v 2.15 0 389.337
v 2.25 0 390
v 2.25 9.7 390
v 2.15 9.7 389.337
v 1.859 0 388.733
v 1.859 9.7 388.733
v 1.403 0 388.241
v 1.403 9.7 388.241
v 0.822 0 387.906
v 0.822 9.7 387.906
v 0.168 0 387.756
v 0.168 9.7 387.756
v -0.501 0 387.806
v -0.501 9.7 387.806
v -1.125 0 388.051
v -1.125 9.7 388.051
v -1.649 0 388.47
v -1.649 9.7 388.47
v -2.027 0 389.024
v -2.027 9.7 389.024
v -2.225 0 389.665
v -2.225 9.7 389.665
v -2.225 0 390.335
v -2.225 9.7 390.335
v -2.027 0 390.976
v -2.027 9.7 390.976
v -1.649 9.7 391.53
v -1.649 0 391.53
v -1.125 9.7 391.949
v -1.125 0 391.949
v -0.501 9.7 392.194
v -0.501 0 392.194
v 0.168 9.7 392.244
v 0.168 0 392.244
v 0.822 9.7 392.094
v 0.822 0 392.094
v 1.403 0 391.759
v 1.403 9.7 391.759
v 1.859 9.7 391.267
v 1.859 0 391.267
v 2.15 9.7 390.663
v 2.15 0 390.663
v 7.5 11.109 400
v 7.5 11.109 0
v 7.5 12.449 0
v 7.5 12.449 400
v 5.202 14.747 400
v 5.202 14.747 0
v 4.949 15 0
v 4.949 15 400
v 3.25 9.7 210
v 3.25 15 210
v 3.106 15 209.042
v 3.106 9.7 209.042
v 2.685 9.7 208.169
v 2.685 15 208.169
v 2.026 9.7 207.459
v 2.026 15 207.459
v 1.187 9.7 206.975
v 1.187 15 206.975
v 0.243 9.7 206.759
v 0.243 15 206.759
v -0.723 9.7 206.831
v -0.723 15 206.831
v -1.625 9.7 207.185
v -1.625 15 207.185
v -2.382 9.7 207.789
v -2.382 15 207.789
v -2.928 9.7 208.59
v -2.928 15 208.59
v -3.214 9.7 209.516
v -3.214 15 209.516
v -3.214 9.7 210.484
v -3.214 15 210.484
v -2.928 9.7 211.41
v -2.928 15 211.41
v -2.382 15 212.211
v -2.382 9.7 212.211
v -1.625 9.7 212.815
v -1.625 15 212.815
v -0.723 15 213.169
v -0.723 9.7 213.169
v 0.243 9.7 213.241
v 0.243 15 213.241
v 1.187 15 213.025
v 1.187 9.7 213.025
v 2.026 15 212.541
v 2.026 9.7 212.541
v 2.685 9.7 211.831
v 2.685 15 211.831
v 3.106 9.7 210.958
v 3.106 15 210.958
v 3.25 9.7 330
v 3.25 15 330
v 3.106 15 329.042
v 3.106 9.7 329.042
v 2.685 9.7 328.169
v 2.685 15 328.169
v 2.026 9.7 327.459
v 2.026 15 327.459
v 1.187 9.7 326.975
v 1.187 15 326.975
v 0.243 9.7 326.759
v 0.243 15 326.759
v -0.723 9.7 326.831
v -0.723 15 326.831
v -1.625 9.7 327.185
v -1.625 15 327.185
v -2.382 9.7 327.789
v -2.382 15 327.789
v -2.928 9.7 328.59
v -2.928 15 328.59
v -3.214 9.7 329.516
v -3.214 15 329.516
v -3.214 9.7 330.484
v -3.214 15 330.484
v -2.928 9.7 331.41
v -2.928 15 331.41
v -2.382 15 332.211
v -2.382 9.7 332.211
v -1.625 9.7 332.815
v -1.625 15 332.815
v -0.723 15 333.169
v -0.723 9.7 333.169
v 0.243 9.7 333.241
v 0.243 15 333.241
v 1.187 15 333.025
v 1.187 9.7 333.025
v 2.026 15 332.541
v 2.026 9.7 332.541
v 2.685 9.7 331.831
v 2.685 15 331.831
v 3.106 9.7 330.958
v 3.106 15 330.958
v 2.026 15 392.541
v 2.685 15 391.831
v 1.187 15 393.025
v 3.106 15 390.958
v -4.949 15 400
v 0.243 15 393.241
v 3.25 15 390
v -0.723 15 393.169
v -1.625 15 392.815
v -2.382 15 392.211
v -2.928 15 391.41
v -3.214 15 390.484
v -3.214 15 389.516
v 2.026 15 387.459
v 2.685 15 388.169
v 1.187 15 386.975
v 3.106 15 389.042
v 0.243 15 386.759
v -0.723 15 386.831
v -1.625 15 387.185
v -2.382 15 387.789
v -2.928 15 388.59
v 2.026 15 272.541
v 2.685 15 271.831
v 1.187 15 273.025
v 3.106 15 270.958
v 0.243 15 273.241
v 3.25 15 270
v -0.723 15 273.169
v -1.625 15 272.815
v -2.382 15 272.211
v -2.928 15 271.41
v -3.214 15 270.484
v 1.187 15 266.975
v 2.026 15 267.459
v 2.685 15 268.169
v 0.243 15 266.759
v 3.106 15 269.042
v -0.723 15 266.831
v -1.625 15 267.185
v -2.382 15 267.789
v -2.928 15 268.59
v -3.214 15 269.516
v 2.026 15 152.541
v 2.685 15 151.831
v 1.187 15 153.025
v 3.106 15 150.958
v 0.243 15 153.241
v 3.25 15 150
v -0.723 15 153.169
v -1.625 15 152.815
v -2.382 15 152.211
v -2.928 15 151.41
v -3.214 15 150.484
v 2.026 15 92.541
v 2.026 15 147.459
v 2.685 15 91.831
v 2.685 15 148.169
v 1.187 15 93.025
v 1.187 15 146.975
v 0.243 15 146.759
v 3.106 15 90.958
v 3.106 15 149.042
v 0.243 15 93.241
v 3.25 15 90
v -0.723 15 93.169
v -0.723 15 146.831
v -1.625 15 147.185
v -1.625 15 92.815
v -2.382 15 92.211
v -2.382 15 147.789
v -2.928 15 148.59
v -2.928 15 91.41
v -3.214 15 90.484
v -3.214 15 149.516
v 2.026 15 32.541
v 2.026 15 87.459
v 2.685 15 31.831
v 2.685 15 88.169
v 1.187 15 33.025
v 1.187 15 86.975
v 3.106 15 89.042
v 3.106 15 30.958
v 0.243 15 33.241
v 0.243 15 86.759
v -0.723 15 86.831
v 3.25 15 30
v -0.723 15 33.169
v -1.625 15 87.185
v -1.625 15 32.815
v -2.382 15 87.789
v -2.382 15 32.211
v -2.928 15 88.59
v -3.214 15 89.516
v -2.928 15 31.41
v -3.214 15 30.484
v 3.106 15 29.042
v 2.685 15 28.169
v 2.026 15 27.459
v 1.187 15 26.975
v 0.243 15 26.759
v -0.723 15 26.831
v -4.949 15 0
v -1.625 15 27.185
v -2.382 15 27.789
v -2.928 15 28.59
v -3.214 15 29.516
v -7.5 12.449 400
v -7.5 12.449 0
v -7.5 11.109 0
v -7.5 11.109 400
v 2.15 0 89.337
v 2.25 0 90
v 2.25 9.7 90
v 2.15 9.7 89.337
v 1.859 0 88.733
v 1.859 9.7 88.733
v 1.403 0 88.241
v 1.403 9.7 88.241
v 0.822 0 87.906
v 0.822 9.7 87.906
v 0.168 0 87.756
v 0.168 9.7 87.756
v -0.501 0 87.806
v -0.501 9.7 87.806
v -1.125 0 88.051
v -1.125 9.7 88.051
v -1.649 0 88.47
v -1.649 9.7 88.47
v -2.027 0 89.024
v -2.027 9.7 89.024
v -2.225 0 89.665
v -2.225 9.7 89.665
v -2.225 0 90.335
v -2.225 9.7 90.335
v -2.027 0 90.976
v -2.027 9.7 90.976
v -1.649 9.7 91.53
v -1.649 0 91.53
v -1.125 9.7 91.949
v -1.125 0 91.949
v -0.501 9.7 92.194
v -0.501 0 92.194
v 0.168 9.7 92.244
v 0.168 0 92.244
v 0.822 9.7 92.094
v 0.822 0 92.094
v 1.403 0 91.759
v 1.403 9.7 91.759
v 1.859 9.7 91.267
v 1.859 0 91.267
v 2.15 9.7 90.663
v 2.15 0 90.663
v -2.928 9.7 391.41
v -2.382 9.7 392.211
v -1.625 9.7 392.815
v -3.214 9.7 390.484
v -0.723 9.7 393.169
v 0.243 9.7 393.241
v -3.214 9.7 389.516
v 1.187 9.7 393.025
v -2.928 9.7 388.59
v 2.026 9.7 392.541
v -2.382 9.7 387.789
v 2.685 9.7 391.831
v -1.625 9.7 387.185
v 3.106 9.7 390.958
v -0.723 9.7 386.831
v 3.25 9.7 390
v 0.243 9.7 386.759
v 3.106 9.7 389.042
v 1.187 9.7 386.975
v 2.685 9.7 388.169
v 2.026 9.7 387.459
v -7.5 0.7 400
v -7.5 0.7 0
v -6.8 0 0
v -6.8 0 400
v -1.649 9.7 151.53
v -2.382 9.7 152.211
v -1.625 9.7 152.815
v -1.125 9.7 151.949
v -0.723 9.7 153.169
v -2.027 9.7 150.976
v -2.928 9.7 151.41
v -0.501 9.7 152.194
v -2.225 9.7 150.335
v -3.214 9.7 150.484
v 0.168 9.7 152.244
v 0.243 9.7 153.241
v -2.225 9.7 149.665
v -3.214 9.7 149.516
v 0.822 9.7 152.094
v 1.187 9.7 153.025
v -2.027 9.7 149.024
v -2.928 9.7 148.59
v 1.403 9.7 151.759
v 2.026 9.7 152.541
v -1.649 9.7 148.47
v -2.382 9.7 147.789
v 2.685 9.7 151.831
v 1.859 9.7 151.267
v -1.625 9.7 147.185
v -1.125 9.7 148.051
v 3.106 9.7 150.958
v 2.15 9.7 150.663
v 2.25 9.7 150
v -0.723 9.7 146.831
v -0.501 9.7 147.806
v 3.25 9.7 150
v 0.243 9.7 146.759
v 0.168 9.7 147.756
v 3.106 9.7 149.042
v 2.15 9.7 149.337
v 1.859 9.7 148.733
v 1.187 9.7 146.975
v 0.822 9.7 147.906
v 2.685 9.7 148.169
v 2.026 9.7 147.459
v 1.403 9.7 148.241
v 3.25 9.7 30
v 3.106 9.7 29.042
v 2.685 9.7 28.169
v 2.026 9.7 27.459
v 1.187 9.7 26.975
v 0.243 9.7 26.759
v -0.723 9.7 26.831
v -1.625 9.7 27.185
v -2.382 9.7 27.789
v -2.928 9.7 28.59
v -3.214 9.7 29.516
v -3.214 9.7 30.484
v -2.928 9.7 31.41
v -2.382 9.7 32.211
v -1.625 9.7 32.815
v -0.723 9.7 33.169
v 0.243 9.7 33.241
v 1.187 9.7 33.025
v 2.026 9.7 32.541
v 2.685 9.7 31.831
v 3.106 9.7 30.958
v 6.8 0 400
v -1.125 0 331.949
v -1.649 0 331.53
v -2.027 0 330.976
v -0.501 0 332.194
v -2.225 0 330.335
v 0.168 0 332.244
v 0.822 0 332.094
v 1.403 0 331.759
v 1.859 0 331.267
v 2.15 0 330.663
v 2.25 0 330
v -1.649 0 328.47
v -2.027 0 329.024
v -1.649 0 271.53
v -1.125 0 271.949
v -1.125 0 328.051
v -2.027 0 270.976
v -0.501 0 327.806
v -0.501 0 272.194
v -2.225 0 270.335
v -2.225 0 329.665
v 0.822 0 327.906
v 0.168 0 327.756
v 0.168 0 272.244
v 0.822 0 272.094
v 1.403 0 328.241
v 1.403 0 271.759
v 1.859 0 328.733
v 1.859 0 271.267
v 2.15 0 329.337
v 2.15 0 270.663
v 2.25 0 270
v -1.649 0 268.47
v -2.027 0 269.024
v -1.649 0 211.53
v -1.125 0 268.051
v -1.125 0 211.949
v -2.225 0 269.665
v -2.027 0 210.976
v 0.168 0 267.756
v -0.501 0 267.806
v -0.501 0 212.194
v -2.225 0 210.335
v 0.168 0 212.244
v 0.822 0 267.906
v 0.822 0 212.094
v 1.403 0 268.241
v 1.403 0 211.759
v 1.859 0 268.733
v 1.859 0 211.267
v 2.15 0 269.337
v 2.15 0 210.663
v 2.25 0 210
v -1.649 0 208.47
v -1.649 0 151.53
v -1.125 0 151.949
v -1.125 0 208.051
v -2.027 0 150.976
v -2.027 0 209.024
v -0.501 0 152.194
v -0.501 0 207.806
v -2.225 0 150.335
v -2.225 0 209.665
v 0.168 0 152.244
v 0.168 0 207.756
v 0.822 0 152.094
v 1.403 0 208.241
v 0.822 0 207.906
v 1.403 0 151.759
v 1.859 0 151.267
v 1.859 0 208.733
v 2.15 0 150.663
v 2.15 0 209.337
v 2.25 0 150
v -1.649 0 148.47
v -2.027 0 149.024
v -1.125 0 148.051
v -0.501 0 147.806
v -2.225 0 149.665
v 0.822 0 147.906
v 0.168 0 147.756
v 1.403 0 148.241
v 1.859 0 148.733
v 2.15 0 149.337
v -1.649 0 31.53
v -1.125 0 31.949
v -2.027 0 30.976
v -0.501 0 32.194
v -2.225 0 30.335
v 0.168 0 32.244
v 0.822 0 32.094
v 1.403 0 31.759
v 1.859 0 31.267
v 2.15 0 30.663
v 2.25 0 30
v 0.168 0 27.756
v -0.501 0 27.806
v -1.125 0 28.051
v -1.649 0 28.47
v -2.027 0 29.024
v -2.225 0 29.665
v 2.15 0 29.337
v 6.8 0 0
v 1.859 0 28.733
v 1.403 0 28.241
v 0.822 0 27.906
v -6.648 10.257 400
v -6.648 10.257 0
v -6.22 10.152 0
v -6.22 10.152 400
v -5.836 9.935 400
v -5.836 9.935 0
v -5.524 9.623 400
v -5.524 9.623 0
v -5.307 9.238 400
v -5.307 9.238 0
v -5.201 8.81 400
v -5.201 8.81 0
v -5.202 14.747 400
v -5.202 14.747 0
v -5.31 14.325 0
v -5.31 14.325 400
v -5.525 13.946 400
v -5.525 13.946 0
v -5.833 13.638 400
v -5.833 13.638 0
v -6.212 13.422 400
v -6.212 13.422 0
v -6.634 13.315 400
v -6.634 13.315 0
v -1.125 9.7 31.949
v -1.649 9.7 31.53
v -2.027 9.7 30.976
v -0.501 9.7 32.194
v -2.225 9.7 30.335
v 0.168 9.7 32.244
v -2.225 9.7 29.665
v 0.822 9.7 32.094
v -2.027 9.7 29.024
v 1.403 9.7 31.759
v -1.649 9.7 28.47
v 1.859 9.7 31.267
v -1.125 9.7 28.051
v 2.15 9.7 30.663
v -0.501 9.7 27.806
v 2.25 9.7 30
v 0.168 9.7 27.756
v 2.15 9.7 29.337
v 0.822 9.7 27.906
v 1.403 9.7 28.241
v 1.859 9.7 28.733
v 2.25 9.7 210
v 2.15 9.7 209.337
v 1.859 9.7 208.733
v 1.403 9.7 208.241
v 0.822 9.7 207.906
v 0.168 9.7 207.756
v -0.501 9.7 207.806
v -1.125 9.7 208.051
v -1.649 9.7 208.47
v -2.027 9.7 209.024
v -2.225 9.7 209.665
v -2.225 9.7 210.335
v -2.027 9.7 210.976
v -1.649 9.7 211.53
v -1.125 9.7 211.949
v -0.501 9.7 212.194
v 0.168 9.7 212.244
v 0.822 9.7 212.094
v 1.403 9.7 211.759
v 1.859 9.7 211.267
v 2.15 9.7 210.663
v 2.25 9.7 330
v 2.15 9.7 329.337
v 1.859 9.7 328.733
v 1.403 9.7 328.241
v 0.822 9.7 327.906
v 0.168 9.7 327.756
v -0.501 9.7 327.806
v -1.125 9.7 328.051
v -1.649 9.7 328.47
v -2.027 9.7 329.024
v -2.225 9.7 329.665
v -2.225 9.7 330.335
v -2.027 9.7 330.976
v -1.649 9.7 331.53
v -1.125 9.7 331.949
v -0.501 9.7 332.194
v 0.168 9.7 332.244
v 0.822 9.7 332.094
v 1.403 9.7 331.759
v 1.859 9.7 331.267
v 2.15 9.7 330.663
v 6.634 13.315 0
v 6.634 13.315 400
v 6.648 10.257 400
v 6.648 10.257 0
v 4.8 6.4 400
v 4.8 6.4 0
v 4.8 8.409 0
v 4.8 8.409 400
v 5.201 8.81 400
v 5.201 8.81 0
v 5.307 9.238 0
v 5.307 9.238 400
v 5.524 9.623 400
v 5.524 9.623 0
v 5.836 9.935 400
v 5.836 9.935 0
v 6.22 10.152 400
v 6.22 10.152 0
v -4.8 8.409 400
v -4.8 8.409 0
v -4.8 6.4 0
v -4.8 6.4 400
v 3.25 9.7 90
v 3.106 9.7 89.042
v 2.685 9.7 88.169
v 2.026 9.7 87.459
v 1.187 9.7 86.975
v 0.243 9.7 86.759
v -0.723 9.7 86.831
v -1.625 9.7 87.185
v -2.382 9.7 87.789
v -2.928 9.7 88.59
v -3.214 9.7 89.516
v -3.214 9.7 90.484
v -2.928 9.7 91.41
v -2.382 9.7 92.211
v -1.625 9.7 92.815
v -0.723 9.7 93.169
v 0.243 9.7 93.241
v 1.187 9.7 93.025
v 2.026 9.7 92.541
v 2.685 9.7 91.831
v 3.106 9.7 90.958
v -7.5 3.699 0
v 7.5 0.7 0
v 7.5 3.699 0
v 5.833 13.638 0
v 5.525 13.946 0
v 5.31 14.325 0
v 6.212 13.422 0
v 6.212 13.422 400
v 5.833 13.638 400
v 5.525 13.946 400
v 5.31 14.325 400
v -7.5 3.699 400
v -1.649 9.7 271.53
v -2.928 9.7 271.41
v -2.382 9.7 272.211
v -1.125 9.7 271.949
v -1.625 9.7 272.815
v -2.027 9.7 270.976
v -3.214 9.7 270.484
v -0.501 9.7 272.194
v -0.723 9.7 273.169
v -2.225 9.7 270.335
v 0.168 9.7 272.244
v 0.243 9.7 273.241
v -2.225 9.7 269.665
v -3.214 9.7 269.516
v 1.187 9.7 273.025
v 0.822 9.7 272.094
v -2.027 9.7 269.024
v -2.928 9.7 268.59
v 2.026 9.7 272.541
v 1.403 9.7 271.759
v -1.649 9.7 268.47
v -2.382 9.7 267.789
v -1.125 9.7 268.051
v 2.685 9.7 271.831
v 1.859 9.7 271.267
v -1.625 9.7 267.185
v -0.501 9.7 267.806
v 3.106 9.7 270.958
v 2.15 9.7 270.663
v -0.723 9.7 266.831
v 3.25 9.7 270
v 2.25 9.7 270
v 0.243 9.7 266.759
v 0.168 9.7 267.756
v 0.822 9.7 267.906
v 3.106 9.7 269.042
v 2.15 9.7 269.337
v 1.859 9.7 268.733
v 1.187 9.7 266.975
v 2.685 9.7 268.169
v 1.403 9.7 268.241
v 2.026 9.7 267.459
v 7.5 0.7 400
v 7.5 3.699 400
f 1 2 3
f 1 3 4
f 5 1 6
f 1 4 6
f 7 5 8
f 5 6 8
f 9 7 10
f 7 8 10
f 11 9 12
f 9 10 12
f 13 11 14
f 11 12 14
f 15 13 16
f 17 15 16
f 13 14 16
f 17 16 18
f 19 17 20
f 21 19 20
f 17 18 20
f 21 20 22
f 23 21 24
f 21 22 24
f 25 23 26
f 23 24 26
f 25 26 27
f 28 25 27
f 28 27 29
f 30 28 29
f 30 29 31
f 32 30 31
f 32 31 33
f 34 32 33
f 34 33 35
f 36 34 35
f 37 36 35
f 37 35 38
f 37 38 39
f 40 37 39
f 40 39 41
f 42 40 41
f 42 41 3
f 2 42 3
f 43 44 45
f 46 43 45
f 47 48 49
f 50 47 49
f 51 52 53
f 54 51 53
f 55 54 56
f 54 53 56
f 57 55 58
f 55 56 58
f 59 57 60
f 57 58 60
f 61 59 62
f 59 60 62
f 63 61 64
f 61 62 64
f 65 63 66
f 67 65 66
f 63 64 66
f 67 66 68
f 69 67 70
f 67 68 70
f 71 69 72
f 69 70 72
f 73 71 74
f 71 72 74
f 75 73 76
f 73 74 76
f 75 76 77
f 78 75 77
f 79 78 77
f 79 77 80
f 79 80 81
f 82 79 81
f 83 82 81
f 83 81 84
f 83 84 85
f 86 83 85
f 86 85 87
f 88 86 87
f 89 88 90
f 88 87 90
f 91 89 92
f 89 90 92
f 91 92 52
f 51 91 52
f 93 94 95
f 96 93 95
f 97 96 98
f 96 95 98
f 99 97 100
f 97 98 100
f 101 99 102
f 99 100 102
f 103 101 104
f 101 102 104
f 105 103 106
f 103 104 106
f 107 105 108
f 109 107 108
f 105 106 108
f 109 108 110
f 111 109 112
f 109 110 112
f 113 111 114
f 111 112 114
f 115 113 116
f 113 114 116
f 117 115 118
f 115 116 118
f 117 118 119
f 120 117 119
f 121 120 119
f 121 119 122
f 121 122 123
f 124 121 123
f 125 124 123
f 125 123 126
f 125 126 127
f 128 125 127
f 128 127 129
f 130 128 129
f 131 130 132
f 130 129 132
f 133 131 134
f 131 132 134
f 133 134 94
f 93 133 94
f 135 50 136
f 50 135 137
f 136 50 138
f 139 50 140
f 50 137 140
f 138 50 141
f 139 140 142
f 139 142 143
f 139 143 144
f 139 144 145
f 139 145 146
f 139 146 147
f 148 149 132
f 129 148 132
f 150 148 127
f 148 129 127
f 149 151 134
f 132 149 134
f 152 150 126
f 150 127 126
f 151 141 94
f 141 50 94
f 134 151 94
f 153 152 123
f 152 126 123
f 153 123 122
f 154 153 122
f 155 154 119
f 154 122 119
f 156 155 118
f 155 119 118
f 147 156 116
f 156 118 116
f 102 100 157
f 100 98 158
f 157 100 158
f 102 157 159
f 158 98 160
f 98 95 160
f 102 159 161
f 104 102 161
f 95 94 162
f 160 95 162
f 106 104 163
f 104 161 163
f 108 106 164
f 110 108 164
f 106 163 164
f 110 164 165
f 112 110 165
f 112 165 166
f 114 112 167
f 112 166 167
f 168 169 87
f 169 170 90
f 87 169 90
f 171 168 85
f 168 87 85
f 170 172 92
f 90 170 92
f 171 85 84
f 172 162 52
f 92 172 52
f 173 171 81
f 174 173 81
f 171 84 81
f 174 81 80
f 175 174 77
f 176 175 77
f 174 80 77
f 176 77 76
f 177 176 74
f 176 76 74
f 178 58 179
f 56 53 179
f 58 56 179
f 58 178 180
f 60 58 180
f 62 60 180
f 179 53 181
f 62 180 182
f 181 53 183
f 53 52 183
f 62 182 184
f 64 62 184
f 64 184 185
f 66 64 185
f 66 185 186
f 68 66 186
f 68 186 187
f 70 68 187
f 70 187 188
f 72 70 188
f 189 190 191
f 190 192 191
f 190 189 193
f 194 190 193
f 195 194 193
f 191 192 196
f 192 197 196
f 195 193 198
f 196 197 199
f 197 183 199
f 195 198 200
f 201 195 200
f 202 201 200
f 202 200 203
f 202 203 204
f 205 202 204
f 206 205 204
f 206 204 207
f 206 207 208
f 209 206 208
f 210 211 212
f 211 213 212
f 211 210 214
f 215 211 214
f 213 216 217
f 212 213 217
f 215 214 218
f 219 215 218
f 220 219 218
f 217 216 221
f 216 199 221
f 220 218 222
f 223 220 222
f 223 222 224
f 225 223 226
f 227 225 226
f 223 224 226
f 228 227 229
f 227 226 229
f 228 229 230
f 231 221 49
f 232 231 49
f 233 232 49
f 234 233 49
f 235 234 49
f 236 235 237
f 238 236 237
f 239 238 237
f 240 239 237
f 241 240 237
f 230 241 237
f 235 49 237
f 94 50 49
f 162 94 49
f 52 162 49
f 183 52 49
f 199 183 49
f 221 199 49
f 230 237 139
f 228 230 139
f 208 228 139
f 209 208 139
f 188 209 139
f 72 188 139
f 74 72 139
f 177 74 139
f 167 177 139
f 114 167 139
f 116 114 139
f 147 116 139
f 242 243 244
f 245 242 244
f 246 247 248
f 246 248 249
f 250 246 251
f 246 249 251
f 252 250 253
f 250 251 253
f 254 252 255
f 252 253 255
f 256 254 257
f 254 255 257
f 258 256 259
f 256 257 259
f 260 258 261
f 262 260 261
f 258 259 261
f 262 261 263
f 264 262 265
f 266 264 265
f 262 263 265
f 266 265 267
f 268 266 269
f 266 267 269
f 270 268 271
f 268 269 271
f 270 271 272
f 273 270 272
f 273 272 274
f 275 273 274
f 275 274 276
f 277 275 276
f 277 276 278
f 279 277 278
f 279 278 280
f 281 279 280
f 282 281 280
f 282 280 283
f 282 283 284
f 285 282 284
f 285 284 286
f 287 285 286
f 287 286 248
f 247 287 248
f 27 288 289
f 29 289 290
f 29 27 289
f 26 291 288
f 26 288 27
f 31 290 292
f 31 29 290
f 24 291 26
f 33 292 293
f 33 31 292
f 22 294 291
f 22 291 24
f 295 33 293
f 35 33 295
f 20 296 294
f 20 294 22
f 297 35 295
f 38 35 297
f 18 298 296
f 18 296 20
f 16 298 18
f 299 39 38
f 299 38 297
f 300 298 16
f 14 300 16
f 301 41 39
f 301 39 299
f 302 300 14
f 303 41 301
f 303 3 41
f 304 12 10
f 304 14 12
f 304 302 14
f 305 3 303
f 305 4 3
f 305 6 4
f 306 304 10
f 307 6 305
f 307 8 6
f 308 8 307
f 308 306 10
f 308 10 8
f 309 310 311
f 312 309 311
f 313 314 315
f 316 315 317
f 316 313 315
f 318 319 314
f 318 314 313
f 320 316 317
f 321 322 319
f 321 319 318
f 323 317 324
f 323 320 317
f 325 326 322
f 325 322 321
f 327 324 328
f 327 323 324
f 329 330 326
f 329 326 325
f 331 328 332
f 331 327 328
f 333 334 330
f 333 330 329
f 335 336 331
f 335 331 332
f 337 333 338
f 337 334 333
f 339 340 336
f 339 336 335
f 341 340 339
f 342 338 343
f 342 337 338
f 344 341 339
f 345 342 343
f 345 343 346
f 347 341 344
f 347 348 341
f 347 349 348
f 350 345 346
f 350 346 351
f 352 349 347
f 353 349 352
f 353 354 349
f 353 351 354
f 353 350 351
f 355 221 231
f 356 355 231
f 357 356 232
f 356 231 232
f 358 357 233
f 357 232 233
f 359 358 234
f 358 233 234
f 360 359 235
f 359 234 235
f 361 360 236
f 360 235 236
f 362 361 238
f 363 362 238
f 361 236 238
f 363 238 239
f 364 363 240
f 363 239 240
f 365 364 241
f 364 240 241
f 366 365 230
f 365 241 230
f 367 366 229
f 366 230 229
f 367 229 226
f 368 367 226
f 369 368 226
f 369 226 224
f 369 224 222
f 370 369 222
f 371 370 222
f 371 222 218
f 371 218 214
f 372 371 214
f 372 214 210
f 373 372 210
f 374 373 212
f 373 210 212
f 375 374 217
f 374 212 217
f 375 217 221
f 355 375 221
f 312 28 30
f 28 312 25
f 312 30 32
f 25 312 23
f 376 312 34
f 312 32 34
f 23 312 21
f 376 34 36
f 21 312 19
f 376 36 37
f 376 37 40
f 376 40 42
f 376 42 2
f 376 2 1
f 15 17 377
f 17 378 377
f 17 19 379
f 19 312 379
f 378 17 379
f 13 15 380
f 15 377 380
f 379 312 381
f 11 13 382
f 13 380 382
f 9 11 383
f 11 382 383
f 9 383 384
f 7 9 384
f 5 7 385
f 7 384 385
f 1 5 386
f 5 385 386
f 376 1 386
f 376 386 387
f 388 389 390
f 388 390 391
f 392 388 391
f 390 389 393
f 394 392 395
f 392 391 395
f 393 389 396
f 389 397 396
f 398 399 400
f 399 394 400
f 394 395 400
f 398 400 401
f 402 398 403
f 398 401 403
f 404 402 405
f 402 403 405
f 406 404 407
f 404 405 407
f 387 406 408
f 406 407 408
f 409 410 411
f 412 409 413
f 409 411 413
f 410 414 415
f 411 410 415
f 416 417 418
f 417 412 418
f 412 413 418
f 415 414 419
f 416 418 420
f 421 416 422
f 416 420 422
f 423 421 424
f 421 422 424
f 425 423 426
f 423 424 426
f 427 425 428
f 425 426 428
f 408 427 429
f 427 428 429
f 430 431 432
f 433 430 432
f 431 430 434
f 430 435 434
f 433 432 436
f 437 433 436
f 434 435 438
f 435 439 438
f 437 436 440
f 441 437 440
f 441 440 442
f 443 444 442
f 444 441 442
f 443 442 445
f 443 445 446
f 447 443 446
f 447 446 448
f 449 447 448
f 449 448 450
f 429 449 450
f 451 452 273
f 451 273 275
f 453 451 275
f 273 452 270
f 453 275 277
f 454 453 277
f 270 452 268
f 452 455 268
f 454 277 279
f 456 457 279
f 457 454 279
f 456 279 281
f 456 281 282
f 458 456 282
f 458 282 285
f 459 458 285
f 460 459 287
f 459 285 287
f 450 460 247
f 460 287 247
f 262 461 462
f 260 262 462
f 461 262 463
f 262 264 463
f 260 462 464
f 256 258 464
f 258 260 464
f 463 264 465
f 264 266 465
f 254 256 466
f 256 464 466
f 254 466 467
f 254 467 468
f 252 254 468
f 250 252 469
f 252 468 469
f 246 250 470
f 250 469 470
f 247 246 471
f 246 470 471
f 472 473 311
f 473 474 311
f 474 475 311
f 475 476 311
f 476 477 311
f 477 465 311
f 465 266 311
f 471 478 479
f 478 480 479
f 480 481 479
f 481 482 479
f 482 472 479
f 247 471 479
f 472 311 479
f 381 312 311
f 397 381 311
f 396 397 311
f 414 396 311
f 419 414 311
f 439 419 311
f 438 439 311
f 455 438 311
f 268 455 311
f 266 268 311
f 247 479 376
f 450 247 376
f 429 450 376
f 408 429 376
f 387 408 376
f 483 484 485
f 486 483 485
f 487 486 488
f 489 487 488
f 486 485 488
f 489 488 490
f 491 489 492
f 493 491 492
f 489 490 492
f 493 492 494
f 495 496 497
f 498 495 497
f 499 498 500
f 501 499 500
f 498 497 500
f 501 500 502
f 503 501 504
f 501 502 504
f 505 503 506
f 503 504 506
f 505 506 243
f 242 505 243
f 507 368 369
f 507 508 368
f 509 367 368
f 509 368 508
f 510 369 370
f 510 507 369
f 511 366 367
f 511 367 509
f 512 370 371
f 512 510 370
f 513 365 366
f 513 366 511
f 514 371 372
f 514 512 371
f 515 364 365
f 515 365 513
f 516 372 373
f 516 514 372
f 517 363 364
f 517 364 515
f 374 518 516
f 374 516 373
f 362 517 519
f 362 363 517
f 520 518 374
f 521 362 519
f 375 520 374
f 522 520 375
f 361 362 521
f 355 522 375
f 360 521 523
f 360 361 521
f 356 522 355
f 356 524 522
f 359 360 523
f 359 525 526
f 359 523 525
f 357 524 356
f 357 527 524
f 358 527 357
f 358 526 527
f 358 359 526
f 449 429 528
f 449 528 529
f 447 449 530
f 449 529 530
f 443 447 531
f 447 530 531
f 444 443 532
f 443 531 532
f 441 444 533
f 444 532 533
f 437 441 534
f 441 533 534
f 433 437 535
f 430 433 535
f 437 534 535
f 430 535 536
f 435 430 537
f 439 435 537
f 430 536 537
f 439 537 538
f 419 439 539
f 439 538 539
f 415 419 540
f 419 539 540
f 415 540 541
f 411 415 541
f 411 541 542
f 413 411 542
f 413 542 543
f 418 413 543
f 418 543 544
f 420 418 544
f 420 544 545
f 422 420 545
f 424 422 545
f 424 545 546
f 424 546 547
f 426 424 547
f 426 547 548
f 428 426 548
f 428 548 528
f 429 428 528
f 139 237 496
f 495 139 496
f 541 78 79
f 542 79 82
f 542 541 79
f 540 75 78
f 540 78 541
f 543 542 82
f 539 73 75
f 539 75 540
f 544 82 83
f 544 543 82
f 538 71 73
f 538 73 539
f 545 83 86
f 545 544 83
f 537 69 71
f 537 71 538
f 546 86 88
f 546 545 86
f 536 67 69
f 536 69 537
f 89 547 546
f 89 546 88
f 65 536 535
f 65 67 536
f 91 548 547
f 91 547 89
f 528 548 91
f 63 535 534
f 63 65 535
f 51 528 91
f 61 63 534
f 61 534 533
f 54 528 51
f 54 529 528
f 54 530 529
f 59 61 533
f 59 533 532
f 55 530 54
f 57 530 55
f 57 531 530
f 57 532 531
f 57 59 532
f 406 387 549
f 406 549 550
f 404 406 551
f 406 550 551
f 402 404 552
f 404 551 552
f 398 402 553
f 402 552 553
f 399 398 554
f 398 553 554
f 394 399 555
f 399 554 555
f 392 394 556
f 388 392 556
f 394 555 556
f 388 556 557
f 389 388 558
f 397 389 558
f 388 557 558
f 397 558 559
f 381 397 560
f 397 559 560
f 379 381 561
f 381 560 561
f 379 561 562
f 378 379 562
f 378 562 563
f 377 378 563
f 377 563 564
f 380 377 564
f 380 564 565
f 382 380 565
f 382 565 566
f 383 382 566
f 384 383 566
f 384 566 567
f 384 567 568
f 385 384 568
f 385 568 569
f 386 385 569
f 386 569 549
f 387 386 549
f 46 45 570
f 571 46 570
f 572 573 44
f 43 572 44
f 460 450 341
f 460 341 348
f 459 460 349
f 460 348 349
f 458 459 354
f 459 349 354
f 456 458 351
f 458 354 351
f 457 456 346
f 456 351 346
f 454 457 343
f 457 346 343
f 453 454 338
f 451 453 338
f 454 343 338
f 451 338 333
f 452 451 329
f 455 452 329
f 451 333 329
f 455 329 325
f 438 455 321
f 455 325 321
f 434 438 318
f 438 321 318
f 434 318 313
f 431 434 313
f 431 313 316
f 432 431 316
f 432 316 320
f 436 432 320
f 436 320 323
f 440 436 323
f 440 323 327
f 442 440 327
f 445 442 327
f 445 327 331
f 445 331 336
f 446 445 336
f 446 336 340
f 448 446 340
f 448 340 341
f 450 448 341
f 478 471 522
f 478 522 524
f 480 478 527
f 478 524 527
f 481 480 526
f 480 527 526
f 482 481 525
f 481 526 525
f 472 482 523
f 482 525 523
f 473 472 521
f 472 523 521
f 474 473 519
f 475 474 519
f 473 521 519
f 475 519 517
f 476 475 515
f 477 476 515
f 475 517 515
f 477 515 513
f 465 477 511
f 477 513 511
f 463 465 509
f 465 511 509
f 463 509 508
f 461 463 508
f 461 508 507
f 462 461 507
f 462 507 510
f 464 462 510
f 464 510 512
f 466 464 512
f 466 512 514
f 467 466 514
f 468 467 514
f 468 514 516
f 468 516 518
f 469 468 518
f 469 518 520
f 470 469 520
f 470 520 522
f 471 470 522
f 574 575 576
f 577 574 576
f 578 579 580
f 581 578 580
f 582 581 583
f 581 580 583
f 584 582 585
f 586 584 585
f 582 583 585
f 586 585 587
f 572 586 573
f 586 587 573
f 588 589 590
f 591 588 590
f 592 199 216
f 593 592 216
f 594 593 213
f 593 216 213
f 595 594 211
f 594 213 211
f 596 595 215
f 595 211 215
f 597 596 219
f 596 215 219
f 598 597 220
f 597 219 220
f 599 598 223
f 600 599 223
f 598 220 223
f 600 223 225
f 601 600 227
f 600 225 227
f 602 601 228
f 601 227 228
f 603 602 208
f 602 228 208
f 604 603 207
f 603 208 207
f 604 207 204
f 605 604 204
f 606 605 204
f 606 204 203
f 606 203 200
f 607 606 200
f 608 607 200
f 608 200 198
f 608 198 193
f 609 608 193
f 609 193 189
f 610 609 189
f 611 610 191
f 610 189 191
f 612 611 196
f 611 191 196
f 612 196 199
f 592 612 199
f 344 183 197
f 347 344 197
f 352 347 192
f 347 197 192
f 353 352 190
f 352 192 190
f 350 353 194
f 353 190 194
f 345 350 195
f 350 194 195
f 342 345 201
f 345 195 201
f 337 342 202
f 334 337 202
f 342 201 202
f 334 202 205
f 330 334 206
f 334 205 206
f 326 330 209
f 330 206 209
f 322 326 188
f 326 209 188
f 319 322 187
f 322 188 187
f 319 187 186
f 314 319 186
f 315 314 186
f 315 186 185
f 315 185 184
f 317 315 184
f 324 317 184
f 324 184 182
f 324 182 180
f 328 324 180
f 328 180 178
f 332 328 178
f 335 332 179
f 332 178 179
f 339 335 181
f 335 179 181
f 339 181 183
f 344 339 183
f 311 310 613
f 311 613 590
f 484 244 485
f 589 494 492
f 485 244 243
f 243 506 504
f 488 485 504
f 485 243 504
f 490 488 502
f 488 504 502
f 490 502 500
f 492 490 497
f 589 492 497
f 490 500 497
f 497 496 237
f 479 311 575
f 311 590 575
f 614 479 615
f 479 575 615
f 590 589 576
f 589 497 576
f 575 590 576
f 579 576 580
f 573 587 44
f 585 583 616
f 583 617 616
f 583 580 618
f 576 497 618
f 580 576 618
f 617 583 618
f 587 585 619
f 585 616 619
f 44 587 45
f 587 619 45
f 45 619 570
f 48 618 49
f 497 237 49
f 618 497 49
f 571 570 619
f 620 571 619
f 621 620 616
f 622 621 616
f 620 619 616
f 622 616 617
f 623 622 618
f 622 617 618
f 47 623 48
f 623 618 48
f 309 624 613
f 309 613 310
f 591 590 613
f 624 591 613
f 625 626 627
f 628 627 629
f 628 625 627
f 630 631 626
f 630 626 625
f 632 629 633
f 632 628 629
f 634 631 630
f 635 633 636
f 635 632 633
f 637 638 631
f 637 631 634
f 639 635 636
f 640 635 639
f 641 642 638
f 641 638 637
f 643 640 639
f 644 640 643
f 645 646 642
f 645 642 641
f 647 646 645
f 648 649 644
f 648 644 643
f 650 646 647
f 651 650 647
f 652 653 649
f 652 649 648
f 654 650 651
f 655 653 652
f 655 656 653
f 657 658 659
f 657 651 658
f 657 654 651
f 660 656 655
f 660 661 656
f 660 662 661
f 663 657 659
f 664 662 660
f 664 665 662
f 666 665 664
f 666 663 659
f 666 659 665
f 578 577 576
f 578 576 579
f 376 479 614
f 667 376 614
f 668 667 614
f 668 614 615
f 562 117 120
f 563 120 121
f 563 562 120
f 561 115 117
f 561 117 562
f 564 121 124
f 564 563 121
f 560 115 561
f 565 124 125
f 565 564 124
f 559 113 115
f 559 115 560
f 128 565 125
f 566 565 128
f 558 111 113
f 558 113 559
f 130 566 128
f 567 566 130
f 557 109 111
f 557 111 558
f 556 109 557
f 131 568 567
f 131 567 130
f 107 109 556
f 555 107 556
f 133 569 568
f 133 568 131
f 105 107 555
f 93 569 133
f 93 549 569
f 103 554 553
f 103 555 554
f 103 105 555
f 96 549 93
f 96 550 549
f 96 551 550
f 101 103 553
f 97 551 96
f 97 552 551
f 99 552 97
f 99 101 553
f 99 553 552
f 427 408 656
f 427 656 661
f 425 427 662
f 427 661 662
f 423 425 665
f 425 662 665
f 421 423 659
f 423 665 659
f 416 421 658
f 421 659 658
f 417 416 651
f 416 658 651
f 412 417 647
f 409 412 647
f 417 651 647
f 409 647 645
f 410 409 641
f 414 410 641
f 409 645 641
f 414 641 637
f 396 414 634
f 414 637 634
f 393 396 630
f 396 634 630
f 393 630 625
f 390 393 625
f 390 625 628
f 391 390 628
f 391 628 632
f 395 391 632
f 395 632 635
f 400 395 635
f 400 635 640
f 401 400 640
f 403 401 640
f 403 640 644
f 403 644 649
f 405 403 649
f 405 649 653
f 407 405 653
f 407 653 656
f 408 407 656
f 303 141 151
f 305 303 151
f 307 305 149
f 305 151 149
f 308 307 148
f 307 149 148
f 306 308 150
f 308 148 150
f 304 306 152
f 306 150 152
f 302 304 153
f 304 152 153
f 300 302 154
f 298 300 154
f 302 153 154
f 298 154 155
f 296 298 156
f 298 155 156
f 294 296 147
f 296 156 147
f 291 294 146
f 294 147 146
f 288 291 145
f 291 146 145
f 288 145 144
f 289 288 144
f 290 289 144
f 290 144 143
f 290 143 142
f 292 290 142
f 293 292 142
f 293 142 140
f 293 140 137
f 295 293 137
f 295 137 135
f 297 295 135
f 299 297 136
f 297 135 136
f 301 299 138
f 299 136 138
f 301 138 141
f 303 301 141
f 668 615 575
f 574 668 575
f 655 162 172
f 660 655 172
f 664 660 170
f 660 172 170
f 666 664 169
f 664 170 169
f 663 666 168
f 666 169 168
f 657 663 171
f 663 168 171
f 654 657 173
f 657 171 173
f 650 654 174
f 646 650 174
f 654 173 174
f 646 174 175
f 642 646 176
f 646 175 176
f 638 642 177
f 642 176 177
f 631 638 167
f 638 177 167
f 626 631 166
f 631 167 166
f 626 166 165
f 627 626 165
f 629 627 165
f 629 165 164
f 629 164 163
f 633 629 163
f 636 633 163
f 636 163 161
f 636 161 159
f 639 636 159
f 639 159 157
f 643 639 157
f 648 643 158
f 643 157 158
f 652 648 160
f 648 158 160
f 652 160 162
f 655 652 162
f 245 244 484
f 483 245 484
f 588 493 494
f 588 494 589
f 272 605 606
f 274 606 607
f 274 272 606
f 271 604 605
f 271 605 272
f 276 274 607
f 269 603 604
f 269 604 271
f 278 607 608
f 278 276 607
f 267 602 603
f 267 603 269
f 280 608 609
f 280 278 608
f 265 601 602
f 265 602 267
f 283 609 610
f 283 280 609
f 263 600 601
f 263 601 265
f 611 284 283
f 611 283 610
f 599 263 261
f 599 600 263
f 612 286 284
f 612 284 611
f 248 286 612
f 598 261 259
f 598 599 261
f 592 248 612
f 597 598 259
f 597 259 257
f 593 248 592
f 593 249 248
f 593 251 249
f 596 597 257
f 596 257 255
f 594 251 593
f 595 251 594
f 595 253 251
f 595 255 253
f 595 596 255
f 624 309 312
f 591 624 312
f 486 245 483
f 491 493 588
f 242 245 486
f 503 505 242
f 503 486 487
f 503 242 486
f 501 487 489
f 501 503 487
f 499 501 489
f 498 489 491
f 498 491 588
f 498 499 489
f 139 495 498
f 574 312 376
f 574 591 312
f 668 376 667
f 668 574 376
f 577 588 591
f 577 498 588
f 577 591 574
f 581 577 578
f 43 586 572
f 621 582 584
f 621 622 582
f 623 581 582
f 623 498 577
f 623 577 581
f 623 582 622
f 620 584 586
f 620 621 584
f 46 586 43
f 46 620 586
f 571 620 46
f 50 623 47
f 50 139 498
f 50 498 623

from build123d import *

# Parameters (mm, degrees)
EXTRUDE_1_DEPTH     = 400
SKETCH_2_R          = 3.25
CUT_EXTRUDE_1_DEPTH = 5.3
SKETCH_3_R          = 2.25
CUT_EXTRUDE_2_DEPTH = 10.7


with BuildPart() as part:
    # Model → Бобышка-Вытянуть1 (new body)
    with BuildSketch(Plane.XY):
        with BuildLine():
            Line((6.8, 0), (7.5, 0.7))
            Line((7.5, 0.7), (7.5, 3.6994391))
            Line((7.5, 3.6994391), (4.7998047, 6.3996344))
            Line((4.7998047, 6.3996344), (4.7998047, 8.409149262))
            Line((4.7998047, 8.409149262), (5.20075838, 8.810103152))
            ThreePointArc((5.20075838, 8.810103152), (5.668922208, 9.789261508), (6.648080611, 10.257425237))
            Line((6.648080611, 10.257425237), (7.5, 11.109345046))
            Line((7.5, 11.109345046), (7.5, 12.449454443))
            Line((7.5, 12.449454443), (6.634490912, 13.314965186))
            ThreePointArc((6.634490912, 13.314965186), (5.668922174, 13.781617126), (5.202270193, 14.747185846))
            Line((5.202270193, 14.747185846), (4.949456226, 15))
            Line((4.949456226, 15), (-4.949456226, 15))
            Line((-4.949456226, 15), (-5.202270193, 14.747185846))
            ThreePointArc((-5.202270193, 14.747185846), (-5.668922174, 13.781617126), (-6.634490912, 13.314965186))
            Line((-6.634490912, 13.314965186), (-7.5, 12.449454443))
            Line((-7.5, 12.449454443), (-7.5, 11.109345046))
            Line((-7.5, 11.109345046), (-6.648080611, 10.257425238))
            ThreePointArc((-6.648080611, 10.257425238), (-5.668922208, 9.789261508), (-5.20075838, 8.810103152))
            Line((-5.20075838, 8.810103152), (-4.7998047, 8.409149262))
            Line((-4.7998047, 8.409149262), (-4.7998047, 6.3996344))
            Line((-4.7998047, 6.3996344), (-7.5, 3.6994391))
            Line((-7.5, 3.6994391), (-7.5, 0.7))
            Line((-7.5, 0.7), (-6.8, 0))
            Line((-6.8, 0), (6.8, 0))
        make_face()
    extrude(amount=EXTRUDE_1_DEPTH)

    # Эскиз2 → Вырез-Вытянуть1 (cut)
    with BuildSketch(Plane(origin=(0, 15, 0), x_dir=(1, 0, 0), z_dir=(0, 1, 0))):
        with Locations((0, -30)):
            Circle(SKETCH_2_R)
        with Locations((0, -90)):
            Circle(SKETCH_2_R)
        with Locations((0, -150)):
            Circle(SKETCH_2_R)
        with Locations((0, -210)):
            Circle(SKETCH_2_R)
        with Locations((0, -270)):
            Circle(SKETCH_2_R)
        with Locations((0, -330)):
            Circle(SKETCH_2_R)
        with Locations((0, -390)):
            Circle(SKETCH_2_R)
        with Locations((0, -450)):
            Circle(SKETCH_2_R)
        with Locations((0, -510)):
            Circle(SKETCH_2_R)
        with Locations((0, -570)):
            Circle(SKETCH_2_R)
    extrude(amount=-CUT_EXTRUDE_1_DEPTH, mode=Mode.SUBTRACT)

    # Эскиз3 → Вырез-Вытянуть2 (cut, through all)
    with BuildSketch(Plane(origin=(0, 9.7, 0), x_dir=(1, 0, 0), z_dir=(0, 1, 0))):
        with Locations((0, -30)):
            Circle(SKETCH_3_R)
        with Locations((0, -90)):
            Circle(SKETCH_3_R)
        with Locations((0, -150)):
            Circle(SKETCH_3_R)
        with Locations((0, -210)):
            Circle(SKETCH_3_R)
        with Locations((0, -270)):
            Circle(SKETCH_3_R)
        with Locations((0, -330)):
            Circle(SKETCH_3_R)
        with Locations((0, -390)):
            Circle(SKETCH_3_R)
        with Locations((0, -450)):
            Circle(SKETCH_3_R)
        with Locations((0, -510)):
            Circle(SKETCH_3_R)
        with Locations((0, -570)):
            Circle(SKETCH_3_R)
    extrude(amount=-CUT_EXTRUDE_2_DEPTH, mode=Mode.SUBTRACT)


solid = part.part
